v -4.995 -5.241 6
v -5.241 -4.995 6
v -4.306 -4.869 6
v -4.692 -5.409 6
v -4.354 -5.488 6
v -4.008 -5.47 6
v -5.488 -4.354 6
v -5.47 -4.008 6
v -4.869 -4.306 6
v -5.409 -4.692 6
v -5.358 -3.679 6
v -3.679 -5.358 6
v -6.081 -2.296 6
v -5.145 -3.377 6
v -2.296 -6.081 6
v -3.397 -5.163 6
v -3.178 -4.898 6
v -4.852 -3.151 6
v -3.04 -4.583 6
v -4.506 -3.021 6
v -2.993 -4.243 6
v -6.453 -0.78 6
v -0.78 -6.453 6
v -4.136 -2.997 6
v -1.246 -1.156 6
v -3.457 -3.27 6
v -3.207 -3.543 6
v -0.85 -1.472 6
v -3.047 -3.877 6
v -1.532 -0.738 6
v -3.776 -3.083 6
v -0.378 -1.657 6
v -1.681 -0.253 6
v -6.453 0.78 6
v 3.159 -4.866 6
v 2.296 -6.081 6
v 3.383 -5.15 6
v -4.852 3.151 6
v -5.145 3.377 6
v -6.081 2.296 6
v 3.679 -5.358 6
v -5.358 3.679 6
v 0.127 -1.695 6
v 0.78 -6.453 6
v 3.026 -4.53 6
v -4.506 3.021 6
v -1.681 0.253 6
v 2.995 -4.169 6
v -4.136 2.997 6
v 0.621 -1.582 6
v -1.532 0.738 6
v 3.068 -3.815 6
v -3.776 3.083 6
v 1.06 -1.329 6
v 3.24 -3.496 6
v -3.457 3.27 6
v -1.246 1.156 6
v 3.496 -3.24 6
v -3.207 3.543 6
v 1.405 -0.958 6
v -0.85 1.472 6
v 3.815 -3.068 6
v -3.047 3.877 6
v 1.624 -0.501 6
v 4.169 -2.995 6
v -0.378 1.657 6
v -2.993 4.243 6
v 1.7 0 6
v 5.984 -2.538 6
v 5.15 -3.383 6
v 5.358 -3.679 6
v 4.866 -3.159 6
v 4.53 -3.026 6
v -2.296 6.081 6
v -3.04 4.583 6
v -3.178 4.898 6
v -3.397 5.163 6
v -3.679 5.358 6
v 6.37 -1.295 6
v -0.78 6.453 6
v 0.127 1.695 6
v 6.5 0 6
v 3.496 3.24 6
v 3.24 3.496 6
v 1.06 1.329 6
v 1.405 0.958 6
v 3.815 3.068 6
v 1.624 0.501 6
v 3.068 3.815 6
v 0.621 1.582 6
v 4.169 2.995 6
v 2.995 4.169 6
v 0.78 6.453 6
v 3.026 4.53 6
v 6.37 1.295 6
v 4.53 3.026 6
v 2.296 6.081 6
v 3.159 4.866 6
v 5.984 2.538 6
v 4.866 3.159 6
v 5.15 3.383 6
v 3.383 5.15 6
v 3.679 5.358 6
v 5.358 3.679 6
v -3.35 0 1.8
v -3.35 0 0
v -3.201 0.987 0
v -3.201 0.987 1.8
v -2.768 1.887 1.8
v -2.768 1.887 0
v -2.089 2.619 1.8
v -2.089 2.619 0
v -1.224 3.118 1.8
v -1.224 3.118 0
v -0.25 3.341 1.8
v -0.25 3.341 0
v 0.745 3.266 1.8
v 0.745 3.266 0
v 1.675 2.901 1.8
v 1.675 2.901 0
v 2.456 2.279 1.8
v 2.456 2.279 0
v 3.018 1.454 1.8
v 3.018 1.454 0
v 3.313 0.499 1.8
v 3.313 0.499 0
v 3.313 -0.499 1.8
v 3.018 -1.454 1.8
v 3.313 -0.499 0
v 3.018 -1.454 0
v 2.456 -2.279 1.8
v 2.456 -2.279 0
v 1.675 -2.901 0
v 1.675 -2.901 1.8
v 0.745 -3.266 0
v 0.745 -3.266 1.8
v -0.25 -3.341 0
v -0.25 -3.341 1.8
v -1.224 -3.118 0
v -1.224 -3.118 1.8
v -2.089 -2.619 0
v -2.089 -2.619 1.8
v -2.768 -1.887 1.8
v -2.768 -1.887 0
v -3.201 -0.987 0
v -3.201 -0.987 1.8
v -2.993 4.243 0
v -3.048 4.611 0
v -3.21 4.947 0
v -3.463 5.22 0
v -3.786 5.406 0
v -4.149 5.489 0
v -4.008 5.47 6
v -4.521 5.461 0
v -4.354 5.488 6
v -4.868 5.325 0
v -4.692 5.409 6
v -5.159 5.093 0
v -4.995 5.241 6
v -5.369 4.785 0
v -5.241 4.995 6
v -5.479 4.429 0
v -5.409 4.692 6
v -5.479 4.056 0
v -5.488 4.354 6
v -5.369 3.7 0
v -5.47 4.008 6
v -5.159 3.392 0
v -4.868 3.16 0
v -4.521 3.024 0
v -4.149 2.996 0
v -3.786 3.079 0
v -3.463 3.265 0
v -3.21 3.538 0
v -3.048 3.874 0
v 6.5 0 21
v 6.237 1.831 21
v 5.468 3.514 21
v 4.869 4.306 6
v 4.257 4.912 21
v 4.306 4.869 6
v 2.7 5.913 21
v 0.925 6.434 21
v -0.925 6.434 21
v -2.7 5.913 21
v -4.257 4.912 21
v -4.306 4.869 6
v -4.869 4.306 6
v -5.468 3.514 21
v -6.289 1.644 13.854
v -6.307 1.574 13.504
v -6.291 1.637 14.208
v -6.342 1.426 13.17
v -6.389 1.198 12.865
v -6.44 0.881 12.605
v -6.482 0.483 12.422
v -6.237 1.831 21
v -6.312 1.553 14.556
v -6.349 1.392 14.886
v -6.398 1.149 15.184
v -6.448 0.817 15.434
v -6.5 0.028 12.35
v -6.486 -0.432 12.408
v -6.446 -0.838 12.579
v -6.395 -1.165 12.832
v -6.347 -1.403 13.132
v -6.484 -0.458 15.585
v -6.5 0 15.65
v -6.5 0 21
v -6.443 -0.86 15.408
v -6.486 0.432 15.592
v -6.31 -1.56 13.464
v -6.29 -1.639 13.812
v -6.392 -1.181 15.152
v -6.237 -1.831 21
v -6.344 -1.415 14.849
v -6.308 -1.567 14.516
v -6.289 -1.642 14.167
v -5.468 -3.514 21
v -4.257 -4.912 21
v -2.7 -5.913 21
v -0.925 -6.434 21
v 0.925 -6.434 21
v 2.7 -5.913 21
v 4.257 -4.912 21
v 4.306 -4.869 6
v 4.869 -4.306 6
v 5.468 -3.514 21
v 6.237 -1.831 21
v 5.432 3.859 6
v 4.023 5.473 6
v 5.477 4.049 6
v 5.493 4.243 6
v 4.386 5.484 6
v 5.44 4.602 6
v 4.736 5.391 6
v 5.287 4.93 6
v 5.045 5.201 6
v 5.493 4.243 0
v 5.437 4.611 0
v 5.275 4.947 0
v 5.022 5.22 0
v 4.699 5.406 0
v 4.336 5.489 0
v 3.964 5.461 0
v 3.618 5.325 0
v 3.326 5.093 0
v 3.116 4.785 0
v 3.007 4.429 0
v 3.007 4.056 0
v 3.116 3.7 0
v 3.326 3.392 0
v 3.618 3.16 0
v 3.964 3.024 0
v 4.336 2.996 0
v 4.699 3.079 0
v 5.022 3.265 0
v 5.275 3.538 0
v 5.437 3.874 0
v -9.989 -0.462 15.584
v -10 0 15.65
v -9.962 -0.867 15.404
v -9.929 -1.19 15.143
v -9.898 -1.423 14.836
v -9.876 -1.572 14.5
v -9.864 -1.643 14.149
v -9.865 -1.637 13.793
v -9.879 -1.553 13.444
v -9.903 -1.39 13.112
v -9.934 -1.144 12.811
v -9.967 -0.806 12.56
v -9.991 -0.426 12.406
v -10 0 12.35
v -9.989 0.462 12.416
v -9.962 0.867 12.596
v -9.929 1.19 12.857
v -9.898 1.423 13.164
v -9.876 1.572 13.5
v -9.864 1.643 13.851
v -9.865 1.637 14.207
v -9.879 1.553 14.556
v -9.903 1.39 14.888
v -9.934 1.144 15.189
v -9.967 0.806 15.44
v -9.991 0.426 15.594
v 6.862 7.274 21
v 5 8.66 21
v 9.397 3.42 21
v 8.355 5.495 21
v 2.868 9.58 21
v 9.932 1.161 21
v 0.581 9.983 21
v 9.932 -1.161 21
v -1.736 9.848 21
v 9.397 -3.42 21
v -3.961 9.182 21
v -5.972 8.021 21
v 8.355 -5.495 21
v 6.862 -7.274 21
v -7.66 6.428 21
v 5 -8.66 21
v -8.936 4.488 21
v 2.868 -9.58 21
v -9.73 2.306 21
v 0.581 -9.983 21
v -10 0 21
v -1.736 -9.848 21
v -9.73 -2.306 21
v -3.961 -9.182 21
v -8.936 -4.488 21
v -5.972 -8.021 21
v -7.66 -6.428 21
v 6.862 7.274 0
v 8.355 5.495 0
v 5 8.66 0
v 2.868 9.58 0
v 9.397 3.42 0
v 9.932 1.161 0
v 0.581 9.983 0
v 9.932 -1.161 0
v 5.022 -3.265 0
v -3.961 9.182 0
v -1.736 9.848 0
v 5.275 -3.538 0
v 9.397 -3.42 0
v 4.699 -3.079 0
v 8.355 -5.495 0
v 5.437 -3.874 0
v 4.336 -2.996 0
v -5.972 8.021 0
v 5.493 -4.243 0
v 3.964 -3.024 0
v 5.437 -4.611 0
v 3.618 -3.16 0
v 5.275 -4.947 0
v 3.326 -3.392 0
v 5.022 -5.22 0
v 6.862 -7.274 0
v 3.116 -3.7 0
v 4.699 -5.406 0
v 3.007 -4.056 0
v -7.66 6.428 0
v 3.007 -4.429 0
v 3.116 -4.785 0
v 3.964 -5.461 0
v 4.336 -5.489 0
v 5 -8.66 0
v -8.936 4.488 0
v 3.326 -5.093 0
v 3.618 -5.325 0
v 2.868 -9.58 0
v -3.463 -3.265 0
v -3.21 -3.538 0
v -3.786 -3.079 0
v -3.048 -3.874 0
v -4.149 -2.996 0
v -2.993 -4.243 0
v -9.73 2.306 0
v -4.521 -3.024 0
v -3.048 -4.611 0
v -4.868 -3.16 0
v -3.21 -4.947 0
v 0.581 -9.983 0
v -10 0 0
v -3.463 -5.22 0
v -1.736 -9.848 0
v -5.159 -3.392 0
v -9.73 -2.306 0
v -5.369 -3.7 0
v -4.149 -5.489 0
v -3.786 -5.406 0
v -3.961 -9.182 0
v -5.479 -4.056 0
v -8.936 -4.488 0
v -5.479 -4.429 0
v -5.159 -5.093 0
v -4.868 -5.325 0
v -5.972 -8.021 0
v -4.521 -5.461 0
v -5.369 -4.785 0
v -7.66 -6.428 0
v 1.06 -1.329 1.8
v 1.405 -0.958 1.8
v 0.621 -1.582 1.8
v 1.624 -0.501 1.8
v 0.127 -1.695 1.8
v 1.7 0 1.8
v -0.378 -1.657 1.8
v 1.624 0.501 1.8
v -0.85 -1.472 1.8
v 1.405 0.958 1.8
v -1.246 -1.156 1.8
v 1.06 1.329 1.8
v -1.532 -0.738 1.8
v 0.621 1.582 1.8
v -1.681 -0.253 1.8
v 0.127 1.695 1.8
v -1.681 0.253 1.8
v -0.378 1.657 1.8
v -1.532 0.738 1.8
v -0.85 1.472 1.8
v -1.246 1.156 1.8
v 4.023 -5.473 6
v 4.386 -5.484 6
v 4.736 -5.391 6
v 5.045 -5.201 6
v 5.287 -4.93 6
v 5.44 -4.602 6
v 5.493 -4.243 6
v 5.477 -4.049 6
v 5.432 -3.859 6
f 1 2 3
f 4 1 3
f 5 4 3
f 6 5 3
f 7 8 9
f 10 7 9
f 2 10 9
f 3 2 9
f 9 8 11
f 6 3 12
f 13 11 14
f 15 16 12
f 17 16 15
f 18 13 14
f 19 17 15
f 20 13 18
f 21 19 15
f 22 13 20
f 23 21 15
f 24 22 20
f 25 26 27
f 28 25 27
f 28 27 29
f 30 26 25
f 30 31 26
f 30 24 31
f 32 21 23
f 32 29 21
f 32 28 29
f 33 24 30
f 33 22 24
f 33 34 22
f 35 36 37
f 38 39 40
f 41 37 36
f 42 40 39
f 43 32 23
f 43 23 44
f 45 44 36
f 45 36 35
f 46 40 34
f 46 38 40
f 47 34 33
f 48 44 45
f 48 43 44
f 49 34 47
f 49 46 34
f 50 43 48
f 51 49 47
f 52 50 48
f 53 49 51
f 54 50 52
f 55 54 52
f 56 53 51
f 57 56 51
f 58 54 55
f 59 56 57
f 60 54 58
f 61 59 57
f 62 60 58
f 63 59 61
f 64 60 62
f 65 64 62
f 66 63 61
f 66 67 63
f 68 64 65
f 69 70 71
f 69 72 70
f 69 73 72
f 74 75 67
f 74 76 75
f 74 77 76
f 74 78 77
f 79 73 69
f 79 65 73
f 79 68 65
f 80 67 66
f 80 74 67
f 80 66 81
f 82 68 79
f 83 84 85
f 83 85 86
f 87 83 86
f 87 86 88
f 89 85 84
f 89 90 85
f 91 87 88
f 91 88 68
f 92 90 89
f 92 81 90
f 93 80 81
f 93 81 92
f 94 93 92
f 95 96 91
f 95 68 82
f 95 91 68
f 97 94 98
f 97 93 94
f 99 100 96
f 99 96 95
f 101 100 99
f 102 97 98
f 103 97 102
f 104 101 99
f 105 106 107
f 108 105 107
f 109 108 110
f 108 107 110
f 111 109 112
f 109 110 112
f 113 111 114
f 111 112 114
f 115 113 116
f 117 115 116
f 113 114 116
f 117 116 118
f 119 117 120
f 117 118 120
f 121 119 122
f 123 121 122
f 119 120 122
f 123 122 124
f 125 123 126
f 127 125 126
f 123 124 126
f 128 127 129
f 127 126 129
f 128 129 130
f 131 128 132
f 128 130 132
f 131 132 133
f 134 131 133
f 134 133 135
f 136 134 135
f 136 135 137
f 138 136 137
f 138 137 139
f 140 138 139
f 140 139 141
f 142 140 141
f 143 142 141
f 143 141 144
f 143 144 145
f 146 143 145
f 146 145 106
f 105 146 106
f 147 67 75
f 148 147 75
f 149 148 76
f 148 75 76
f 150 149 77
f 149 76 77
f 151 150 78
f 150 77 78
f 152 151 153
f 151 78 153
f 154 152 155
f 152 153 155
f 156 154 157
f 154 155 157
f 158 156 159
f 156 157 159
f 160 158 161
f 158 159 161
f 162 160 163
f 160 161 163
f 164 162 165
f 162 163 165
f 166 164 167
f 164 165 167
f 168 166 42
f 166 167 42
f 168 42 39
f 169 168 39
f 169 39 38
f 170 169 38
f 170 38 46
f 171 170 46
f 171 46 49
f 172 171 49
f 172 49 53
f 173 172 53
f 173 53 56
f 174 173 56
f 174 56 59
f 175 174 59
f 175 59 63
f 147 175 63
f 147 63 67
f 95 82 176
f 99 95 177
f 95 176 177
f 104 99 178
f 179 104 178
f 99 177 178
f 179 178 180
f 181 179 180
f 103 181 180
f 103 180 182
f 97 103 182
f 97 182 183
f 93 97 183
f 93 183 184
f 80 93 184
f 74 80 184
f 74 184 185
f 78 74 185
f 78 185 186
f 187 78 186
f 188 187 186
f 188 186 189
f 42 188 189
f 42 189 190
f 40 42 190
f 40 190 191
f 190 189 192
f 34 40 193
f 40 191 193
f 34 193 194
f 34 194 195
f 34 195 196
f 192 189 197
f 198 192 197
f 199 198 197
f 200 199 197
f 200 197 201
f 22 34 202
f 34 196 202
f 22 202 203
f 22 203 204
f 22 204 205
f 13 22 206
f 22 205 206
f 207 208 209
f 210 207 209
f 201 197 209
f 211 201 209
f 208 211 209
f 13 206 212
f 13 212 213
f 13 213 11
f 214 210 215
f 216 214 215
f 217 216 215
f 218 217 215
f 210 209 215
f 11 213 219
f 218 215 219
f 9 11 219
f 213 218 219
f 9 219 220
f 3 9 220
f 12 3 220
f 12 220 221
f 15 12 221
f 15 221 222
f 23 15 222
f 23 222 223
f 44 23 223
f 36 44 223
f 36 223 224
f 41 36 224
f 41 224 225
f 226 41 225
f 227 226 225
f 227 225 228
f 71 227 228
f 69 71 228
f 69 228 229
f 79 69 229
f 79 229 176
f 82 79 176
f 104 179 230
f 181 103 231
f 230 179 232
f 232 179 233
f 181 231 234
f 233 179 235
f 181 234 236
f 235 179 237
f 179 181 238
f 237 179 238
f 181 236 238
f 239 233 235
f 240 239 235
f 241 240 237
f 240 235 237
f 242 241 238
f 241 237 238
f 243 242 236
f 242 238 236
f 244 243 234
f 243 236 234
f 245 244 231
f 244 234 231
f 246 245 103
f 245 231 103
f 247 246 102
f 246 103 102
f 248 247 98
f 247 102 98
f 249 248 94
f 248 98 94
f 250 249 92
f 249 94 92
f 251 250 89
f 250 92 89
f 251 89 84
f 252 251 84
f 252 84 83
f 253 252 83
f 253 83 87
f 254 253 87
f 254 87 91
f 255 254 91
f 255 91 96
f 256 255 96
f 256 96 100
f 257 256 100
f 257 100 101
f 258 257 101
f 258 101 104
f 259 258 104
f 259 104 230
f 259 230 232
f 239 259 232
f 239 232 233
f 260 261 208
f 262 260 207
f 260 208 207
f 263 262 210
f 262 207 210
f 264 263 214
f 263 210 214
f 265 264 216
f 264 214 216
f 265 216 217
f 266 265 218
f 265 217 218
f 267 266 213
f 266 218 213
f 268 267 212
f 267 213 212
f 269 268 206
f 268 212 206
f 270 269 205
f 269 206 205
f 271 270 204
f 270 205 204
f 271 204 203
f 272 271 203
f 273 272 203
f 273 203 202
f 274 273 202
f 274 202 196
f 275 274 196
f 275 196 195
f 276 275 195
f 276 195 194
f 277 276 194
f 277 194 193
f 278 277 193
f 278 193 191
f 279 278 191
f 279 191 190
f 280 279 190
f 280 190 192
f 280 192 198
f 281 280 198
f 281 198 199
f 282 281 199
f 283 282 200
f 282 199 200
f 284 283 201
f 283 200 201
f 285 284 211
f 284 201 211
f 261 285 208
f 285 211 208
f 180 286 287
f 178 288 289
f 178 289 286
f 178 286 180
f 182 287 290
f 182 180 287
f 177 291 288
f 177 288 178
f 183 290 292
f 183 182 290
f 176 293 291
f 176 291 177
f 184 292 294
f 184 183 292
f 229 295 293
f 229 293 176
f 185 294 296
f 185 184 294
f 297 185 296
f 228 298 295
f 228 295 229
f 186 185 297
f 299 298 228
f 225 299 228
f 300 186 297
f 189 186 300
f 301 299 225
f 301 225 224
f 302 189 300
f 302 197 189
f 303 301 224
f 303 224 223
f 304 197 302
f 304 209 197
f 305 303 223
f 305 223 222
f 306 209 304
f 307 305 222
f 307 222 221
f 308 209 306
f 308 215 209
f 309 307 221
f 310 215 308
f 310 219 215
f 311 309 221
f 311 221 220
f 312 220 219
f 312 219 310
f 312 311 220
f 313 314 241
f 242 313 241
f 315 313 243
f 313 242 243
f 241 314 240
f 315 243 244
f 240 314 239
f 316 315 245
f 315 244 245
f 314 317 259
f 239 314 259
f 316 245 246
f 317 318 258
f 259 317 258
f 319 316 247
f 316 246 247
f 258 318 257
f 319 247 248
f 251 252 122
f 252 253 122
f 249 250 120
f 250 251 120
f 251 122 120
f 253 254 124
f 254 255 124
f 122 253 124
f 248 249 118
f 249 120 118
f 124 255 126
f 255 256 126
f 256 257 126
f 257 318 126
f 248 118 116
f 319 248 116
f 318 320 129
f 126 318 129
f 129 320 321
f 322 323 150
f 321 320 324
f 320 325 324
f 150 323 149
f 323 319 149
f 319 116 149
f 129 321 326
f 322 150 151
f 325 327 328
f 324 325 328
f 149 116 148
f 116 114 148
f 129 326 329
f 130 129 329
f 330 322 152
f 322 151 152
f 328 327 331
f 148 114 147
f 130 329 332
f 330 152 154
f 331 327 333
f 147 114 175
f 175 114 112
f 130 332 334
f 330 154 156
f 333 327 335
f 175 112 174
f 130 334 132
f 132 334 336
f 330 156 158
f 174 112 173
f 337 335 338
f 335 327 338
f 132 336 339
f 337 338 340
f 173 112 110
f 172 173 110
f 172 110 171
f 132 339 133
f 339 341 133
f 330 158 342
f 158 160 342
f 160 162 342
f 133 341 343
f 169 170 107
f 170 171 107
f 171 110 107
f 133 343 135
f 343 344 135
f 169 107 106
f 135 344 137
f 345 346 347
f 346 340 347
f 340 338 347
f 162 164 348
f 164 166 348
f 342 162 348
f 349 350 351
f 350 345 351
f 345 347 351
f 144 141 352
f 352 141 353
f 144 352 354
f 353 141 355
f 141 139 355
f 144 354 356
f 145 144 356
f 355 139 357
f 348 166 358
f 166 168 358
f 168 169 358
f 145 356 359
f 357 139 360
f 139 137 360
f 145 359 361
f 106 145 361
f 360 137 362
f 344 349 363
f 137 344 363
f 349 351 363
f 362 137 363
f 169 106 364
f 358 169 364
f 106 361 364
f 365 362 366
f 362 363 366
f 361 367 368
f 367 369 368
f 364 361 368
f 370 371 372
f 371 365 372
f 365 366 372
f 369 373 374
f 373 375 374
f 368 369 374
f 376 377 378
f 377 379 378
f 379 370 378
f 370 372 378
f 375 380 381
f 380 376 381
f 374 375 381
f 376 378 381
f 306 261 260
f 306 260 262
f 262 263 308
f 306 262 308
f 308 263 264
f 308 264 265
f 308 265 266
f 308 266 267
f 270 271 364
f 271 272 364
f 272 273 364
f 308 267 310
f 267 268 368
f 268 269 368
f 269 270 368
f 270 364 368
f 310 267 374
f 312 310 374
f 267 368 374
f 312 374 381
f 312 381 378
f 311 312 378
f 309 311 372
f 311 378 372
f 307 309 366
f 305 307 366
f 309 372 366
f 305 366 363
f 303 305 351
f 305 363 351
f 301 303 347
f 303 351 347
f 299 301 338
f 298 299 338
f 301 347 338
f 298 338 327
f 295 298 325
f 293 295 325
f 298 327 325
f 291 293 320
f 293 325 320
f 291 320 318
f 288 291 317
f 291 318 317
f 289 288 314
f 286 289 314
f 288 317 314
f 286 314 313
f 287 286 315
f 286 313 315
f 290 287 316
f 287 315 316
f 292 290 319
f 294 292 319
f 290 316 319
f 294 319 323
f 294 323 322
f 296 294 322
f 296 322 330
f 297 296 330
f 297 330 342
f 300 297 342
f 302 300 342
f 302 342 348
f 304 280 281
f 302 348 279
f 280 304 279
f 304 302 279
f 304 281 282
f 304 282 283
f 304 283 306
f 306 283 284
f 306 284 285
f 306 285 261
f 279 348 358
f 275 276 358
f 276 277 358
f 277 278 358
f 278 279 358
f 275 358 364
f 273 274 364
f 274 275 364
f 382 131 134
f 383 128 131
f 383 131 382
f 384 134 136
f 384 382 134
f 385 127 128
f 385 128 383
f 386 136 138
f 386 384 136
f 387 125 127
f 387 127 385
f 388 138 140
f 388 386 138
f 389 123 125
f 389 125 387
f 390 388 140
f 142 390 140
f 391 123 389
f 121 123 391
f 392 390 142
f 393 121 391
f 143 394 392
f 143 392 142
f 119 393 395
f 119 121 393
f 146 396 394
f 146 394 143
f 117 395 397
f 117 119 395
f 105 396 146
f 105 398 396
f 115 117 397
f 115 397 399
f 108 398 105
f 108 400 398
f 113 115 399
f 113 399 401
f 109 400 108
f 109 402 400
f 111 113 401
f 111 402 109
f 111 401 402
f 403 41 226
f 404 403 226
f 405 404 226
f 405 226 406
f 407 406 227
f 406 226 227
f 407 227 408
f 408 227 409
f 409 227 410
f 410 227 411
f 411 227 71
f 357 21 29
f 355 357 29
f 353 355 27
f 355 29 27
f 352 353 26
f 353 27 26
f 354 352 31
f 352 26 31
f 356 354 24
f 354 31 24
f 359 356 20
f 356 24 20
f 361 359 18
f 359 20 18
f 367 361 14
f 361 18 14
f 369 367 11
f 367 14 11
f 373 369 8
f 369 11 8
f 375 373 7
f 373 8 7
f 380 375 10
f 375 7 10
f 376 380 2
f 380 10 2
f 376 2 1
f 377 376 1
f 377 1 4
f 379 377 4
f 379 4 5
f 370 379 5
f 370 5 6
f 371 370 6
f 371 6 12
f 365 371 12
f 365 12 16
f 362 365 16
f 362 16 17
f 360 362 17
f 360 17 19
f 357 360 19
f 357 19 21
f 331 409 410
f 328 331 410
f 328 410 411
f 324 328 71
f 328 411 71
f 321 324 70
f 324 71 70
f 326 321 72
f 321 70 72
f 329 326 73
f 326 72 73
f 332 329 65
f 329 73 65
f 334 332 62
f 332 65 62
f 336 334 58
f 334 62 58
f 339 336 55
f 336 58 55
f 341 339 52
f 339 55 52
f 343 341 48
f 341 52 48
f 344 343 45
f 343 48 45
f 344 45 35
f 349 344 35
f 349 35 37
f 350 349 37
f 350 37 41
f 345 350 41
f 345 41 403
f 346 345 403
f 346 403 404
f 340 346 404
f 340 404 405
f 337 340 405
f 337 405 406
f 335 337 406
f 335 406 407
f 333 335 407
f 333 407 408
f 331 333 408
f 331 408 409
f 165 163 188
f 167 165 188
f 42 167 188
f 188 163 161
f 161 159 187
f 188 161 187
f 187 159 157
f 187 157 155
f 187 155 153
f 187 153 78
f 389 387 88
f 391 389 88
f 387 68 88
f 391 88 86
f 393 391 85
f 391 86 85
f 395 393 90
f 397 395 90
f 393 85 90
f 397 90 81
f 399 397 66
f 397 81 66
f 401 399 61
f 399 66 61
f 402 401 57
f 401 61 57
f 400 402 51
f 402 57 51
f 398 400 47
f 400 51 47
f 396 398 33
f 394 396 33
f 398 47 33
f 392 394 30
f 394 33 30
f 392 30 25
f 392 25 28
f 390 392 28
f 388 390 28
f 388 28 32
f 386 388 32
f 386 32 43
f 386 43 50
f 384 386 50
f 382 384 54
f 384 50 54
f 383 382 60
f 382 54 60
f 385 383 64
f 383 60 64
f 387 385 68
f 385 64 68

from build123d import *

# Parameters (mm, degrees)
SKETCH_1_R                  = 10
EXTRUDE_1_DEPTH             = 21
SKETCH_2_R                  = 6.5
CUT_EXTRUDE_1_DEPTH         = 15
M4X0_71_D                   = 3.3
M4X0_71_DEPTH               = 5
M4X0_71_TIP                 = 0.991420021
M3X0_51_D                   = 2.5
M3X0_51_DEPTH               = 6
HOLE_WIZARD_M31_D           = 3.4
HOLE_WIZARD_M31_CBORE_D     = 6.7
HOLE_WIZARD_M31_CBORE_DEPTH = 1.8


with BuildPart() as part:
    # Эскиз1 → Бобышка-Вытянуть1 (new body)
    with BuildSketch(Plane.XY):
        with Locations(Location((0, 0, 0), (0, 0, 180))):
            Circle(SKETCH_1_R)
    extrude(amount=EXTRUDE_1_DEPTH)

    # Эскиз2 → Вырез-Вытянуть1 (cut)
    with BuildSketch(Plane.XY.offset(21)):
        Circle(SKETCH_2_R)
    extrude(amount=-CUT_EXTRUDE_1_DEPTH, mode=Mode.SUBTRACT)

    # Отверстие обработанное метчиком M4x0.71
    with Locations(Plane(origin=(-10, 0, 0), x_dir=(0, 0, -1), z_dir=(-1, 0, 0))):
        with Locations((-14, 0)):
            Hole(M4X0_71_D / 2, depth=M4X0_71_DEPTH)
            with Locations((0, 0, -(M4X0_71_DEPTH + M4X0_71_TIP / 2))):  # 118° drill point
                Cone(0, M4X0_71_D / 2, M4X0_71_TIP, mode=Mode.SUBTRACT)

    # Отверстие обработанное метчиком M3x0.51
    with Locations(Plane(origin=(0, 0, 0), x_dir=(-1, 0, 0), z_dir=(0, 0, -1))):
        with Locations((-4.242640687, 4.242640687), (4.242640687, 4.242640687), (4.242640687, -4.242640687), (-4.242640687, -4.242640687)):
            Hole(M3X0_51_D / 2, depth=M3X0_51_DEPTH)

    # Цековка для  винта с полукруглой головкой M31 (through all)
    with Locations(Plane(origin=(0, 0, 0), x_dir=(-1, 0, 0), z_dir=(0, 0, -1))):
        with Locations((0, 0)):
            CounterBoreHole(HOLE_WIZARD_M31_D / 2, HOLE_WIZARD_M31_CBORE_D / 2, HOLE_WIZARD_M31_CBORE_DEPTH)


solid = part.part
